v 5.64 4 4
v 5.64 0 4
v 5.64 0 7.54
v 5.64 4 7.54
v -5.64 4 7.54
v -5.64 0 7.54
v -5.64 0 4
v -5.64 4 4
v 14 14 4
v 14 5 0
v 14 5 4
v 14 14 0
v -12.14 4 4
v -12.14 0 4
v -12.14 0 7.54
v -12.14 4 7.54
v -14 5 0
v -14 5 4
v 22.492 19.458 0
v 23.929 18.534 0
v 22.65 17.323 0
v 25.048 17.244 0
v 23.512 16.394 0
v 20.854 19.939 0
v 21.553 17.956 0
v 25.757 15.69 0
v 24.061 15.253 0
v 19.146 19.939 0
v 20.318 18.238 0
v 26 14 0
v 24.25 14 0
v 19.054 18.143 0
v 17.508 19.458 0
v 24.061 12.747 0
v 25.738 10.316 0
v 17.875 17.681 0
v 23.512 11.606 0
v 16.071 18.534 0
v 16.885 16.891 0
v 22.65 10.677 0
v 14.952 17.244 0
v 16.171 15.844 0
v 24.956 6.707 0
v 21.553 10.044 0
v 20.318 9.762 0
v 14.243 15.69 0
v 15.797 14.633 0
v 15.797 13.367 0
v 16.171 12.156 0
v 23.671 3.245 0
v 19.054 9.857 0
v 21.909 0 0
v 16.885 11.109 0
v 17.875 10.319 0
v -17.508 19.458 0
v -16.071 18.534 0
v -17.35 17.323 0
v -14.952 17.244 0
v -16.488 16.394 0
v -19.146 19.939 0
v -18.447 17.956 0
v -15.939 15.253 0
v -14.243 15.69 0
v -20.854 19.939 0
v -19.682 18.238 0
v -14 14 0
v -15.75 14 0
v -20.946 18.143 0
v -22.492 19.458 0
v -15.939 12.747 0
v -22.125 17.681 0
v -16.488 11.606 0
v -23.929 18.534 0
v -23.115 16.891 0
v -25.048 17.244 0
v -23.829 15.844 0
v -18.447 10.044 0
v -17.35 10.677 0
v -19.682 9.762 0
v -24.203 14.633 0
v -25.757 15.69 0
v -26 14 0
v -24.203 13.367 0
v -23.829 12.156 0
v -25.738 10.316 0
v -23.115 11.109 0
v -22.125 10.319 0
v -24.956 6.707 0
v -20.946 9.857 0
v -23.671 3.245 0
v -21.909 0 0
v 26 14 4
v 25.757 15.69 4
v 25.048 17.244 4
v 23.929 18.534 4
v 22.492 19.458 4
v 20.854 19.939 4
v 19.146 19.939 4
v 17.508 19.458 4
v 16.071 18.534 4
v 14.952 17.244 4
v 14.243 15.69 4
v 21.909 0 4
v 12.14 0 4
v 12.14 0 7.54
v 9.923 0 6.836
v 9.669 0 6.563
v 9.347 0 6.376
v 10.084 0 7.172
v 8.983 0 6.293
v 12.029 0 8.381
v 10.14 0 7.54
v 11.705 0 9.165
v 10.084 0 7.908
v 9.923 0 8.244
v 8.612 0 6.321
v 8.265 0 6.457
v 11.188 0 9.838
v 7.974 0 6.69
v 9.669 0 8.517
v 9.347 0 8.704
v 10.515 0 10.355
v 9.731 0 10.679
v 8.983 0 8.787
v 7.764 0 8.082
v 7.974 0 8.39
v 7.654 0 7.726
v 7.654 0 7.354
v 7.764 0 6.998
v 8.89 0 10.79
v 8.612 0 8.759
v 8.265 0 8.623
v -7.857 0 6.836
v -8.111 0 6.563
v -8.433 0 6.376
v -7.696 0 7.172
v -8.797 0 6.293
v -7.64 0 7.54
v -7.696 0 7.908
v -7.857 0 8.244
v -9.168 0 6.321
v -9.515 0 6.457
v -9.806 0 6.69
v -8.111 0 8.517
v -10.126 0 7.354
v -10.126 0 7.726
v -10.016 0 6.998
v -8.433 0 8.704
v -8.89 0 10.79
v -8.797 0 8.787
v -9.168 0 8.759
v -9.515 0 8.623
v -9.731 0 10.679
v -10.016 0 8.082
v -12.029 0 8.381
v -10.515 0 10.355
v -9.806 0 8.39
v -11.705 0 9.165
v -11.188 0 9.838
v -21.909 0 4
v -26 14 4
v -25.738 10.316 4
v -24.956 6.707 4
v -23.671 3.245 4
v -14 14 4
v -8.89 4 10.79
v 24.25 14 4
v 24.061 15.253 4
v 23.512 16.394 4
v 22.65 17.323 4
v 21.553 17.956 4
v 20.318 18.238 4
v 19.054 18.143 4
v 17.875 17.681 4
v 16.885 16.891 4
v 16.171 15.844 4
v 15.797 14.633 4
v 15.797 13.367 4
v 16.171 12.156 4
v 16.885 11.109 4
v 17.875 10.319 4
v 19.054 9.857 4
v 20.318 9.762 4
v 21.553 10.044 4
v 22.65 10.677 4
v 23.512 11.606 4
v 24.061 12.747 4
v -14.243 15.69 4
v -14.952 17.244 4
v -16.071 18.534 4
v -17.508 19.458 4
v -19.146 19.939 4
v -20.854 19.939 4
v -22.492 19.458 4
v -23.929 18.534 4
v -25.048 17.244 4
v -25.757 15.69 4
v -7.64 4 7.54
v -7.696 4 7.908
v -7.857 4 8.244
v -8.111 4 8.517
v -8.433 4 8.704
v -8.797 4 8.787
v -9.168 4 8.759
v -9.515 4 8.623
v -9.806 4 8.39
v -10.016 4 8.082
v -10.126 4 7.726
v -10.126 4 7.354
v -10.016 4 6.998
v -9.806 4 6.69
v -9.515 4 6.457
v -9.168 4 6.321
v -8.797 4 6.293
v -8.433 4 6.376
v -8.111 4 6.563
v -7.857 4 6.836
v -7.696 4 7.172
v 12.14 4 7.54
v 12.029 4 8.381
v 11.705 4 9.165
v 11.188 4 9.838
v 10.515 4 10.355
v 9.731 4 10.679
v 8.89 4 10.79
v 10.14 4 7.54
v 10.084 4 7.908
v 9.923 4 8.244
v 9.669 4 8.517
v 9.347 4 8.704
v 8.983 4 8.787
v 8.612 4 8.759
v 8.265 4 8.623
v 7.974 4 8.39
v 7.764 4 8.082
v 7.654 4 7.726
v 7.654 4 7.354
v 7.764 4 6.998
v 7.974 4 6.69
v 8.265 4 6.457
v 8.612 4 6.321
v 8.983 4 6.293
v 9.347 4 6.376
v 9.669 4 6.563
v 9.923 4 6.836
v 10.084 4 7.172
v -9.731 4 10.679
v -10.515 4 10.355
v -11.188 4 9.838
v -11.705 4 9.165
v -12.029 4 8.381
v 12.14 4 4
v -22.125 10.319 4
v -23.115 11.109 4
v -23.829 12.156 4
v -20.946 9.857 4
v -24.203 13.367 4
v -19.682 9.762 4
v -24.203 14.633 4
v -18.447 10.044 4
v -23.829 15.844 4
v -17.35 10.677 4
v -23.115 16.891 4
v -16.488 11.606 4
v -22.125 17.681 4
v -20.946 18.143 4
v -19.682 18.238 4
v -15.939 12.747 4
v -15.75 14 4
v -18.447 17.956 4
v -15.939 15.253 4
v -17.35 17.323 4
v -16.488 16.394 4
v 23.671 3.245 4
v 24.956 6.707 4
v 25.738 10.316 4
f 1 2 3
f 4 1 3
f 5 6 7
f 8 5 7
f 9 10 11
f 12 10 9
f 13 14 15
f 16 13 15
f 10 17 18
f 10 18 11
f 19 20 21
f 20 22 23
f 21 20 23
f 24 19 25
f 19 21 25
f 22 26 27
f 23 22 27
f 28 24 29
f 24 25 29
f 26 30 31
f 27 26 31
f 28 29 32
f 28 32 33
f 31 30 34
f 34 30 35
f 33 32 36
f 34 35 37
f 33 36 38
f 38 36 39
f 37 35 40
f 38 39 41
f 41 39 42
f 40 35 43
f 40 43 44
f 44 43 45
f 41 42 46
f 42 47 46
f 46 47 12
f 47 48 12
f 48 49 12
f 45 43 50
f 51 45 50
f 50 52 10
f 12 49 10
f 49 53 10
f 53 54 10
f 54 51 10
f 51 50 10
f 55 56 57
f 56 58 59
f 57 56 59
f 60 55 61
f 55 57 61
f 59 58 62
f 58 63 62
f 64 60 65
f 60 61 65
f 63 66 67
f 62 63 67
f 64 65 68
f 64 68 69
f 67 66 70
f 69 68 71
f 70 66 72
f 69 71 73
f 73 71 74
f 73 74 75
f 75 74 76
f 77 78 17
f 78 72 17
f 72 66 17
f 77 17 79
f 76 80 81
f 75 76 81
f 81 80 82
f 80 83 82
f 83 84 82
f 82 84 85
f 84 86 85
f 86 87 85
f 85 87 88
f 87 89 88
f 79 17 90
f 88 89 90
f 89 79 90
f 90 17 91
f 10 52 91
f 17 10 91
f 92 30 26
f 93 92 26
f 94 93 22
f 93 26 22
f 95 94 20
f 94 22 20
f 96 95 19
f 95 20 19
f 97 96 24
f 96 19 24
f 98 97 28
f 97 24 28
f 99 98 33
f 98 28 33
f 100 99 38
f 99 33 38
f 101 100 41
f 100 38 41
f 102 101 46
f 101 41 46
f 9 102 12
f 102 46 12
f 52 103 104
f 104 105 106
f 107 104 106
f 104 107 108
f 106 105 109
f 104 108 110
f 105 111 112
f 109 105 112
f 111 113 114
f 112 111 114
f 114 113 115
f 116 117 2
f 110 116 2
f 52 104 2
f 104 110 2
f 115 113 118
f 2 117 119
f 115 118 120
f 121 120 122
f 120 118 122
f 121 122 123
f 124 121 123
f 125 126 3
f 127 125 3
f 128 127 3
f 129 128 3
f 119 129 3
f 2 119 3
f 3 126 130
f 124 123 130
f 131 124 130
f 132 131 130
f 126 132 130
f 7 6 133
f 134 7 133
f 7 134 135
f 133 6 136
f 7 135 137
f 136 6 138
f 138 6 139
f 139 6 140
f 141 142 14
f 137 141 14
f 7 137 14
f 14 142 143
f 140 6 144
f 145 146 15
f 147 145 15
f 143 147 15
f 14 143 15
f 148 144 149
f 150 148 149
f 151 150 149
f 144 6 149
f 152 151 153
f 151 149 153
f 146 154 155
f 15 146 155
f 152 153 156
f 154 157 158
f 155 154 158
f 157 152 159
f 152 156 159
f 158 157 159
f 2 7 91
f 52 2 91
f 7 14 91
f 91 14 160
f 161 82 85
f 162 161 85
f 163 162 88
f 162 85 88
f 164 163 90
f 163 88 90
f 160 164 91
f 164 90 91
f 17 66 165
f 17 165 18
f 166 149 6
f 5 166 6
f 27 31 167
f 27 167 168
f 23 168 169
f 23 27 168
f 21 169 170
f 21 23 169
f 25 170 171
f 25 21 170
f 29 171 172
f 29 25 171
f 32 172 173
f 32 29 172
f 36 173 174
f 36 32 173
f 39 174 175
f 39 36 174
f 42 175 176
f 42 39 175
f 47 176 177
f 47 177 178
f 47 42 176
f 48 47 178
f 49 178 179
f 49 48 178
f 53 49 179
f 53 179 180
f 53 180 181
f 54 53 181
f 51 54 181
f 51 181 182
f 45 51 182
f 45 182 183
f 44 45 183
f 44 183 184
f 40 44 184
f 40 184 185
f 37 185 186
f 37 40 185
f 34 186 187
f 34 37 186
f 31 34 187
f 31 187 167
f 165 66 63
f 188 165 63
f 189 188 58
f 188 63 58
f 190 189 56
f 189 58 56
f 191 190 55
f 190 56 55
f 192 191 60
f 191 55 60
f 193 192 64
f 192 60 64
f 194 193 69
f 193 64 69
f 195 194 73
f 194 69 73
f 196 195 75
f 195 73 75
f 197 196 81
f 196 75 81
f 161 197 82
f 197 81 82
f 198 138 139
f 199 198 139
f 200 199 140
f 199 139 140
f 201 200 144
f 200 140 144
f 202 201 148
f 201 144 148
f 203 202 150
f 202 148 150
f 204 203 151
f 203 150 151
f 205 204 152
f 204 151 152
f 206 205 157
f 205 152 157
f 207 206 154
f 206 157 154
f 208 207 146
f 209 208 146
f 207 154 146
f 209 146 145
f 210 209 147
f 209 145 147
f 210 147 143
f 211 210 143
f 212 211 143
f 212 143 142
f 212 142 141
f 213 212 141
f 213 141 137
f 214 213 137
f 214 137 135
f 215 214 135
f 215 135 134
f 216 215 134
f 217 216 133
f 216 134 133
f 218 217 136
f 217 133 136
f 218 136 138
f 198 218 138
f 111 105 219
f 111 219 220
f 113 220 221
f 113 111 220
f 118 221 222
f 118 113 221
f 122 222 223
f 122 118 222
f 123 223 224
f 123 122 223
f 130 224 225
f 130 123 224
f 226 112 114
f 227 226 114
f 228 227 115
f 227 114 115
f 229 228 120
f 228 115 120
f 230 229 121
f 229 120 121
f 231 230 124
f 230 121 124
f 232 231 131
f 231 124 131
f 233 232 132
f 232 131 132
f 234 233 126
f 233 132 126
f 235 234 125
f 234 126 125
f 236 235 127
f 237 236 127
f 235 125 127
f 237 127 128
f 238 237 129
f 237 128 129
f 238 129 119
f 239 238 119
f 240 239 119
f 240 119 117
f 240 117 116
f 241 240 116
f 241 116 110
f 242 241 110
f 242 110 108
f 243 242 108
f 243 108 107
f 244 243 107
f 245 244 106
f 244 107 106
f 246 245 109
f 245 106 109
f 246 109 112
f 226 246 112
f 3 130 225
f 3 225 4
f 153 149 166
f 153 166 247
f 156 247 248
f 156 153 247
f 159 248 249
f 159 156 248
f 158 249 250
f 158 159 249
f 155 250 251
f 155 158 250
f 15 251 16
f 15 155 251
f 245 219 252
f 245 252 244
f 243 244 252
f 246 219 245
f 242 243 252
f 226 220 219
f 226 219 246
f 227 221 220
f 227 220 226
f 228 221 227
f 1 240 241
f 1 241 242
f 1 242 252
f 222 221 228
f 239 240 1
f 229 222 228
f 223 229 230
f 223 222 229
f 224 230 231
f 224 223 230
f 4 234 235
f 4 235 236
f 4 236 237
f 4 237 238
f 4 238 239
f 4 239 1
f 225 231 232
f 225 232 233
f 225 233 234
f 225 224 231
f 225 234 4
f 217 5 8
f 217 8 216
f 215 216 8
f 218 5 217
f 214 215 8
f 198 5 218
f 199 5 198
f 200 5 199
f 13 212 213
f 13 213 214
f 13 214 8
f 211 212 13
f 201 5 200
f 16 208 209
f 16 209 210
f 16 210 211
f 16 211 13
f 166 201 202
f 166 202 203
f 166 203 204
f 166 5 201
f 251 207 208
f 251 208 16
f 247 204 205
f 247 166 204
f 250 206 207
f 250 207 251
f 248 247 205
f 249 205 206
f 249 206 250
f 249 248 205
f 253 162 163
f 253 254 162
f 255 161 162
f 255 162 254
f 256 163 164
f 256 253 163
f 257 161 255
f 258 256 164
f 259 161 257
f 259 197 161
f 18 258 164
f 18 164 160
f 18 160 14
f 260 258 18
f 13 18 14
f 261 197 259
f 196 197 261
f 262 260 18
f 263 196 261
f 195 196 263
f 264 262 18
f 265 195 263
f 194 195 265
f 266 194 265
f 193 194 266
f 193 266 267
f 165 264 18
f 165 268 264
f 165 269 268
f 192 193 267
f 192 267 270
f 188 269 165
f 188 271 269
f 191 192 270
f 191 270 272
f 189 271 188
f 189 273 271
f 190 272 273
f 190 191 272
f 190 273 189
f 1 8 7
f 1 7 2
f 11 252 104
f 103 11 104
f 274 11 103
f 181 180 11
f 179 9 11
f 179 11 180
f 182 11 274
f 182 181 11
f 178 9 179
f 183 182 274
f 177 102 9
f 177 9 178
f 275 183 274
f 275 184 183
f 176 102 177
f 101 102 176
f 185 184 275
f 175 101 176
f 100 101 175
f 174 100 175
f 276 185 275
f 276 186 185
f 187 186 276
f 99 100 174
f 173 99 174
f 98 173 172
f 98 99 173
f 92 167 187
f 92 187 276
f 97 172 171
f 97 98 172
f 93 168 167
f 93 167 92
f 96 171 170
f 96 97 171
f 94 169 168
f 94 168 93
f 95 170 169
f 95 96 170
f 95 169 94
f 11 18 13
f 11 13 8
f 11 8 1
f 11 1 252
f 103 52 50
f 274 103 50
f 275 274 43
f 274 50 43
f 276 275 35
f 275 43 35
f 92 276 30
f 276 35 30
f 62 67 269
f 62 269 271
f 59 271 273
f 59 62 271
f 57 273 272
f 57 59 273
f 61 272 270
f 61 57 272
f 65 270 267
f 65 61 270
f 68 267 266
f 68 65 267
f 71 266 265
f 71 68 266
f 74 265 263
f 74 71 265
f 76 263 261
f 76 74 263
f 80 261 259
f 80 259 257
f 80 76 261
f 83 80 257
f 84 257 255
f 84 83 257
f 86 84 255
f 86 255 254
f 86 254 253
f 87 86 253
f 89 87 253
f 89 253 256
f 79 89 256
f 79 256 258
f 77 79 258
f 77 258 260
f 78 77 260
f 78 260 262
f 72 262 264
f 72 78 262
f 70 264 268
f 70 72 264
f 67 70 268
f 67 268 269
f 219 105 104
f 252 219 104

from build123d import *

# Parameters (mm, degrees)
SKETCH_R     = 4.25
PAD_DEPTH    = 4
SKETCH001_R  = 1.25
PAD001_DEPTH = 4


with BuildPart() as part:
    # Sketch → Pad (new body)
    with BuildSketch(Plane.XY):
        with BuildLine():
            ThreePointArc((-14, 14), (-20, 20), (-26, 14))
            ThreePointArc((-26, 14), (-24.956276, 6.707245), (-21.908902, 0))
            Line((-21.908902, 0), (21.908902, 0))
            ThreePointArc((21.908902, 0), (24.956276, 6.707245), (26, 14))
            ThreePointArc((26, 14), (20, 20), (14, 14))
            Line((14, 5), (14, 14))
            Line((-14, 5), (14, 5))
            Line((-14, 14), (-14, 5))
        make_face()
        with Locations((-20, 14)):
            Circle(SKETCH_R, mode=Mode.SUBTRACT)
        with Locations((20, 14)):
            Circle(SKETCH_R, mode=Mode.SUBTRACT)
    extrude(amount=PAD_DEPTH)

    # Sketch001 (on Face4 of Pad) → Pad001 (join)
    with BuildSketch(Plane.XZ):
        with BuildLine():
            Line((-5.64, 7.54), (-5.64, 3.19))
            Line((-5.64, 3.19), (5.64, 3.19))
            Line((5.64, 3.19), (5.64, 7.54))
            Line((8.89, 10.79), (5.64, 7.54))
            ThreePointArc((12.14, 7.54), (11.188097, 9.838097), (8.89, 10.79))
            Line((12.14, 7.54), (12.14, 0))
            Line((12.14, 0), (-12.14, 0))
            Line((-12.14, 0), (-12.14, 7.54))
            ThreePointArc((-8.89, 10.79), (-11.188097, 9.838097), (-12.14, 7.54))
            Line((-8.89, 10.79), (-5.64, 7.54))
        make_face()
        with Locations((-8.89, 7.54)):
            Circle(SKETCH001_R, mode=Mode.SUBTRACT)
        with Locations((8.89, 7.54)):
            Circle(SKETCH001_R, mode=Mode.SUBTRACT)
    extrude(amount=-PAD001_DEPTH)


solid = part.part
